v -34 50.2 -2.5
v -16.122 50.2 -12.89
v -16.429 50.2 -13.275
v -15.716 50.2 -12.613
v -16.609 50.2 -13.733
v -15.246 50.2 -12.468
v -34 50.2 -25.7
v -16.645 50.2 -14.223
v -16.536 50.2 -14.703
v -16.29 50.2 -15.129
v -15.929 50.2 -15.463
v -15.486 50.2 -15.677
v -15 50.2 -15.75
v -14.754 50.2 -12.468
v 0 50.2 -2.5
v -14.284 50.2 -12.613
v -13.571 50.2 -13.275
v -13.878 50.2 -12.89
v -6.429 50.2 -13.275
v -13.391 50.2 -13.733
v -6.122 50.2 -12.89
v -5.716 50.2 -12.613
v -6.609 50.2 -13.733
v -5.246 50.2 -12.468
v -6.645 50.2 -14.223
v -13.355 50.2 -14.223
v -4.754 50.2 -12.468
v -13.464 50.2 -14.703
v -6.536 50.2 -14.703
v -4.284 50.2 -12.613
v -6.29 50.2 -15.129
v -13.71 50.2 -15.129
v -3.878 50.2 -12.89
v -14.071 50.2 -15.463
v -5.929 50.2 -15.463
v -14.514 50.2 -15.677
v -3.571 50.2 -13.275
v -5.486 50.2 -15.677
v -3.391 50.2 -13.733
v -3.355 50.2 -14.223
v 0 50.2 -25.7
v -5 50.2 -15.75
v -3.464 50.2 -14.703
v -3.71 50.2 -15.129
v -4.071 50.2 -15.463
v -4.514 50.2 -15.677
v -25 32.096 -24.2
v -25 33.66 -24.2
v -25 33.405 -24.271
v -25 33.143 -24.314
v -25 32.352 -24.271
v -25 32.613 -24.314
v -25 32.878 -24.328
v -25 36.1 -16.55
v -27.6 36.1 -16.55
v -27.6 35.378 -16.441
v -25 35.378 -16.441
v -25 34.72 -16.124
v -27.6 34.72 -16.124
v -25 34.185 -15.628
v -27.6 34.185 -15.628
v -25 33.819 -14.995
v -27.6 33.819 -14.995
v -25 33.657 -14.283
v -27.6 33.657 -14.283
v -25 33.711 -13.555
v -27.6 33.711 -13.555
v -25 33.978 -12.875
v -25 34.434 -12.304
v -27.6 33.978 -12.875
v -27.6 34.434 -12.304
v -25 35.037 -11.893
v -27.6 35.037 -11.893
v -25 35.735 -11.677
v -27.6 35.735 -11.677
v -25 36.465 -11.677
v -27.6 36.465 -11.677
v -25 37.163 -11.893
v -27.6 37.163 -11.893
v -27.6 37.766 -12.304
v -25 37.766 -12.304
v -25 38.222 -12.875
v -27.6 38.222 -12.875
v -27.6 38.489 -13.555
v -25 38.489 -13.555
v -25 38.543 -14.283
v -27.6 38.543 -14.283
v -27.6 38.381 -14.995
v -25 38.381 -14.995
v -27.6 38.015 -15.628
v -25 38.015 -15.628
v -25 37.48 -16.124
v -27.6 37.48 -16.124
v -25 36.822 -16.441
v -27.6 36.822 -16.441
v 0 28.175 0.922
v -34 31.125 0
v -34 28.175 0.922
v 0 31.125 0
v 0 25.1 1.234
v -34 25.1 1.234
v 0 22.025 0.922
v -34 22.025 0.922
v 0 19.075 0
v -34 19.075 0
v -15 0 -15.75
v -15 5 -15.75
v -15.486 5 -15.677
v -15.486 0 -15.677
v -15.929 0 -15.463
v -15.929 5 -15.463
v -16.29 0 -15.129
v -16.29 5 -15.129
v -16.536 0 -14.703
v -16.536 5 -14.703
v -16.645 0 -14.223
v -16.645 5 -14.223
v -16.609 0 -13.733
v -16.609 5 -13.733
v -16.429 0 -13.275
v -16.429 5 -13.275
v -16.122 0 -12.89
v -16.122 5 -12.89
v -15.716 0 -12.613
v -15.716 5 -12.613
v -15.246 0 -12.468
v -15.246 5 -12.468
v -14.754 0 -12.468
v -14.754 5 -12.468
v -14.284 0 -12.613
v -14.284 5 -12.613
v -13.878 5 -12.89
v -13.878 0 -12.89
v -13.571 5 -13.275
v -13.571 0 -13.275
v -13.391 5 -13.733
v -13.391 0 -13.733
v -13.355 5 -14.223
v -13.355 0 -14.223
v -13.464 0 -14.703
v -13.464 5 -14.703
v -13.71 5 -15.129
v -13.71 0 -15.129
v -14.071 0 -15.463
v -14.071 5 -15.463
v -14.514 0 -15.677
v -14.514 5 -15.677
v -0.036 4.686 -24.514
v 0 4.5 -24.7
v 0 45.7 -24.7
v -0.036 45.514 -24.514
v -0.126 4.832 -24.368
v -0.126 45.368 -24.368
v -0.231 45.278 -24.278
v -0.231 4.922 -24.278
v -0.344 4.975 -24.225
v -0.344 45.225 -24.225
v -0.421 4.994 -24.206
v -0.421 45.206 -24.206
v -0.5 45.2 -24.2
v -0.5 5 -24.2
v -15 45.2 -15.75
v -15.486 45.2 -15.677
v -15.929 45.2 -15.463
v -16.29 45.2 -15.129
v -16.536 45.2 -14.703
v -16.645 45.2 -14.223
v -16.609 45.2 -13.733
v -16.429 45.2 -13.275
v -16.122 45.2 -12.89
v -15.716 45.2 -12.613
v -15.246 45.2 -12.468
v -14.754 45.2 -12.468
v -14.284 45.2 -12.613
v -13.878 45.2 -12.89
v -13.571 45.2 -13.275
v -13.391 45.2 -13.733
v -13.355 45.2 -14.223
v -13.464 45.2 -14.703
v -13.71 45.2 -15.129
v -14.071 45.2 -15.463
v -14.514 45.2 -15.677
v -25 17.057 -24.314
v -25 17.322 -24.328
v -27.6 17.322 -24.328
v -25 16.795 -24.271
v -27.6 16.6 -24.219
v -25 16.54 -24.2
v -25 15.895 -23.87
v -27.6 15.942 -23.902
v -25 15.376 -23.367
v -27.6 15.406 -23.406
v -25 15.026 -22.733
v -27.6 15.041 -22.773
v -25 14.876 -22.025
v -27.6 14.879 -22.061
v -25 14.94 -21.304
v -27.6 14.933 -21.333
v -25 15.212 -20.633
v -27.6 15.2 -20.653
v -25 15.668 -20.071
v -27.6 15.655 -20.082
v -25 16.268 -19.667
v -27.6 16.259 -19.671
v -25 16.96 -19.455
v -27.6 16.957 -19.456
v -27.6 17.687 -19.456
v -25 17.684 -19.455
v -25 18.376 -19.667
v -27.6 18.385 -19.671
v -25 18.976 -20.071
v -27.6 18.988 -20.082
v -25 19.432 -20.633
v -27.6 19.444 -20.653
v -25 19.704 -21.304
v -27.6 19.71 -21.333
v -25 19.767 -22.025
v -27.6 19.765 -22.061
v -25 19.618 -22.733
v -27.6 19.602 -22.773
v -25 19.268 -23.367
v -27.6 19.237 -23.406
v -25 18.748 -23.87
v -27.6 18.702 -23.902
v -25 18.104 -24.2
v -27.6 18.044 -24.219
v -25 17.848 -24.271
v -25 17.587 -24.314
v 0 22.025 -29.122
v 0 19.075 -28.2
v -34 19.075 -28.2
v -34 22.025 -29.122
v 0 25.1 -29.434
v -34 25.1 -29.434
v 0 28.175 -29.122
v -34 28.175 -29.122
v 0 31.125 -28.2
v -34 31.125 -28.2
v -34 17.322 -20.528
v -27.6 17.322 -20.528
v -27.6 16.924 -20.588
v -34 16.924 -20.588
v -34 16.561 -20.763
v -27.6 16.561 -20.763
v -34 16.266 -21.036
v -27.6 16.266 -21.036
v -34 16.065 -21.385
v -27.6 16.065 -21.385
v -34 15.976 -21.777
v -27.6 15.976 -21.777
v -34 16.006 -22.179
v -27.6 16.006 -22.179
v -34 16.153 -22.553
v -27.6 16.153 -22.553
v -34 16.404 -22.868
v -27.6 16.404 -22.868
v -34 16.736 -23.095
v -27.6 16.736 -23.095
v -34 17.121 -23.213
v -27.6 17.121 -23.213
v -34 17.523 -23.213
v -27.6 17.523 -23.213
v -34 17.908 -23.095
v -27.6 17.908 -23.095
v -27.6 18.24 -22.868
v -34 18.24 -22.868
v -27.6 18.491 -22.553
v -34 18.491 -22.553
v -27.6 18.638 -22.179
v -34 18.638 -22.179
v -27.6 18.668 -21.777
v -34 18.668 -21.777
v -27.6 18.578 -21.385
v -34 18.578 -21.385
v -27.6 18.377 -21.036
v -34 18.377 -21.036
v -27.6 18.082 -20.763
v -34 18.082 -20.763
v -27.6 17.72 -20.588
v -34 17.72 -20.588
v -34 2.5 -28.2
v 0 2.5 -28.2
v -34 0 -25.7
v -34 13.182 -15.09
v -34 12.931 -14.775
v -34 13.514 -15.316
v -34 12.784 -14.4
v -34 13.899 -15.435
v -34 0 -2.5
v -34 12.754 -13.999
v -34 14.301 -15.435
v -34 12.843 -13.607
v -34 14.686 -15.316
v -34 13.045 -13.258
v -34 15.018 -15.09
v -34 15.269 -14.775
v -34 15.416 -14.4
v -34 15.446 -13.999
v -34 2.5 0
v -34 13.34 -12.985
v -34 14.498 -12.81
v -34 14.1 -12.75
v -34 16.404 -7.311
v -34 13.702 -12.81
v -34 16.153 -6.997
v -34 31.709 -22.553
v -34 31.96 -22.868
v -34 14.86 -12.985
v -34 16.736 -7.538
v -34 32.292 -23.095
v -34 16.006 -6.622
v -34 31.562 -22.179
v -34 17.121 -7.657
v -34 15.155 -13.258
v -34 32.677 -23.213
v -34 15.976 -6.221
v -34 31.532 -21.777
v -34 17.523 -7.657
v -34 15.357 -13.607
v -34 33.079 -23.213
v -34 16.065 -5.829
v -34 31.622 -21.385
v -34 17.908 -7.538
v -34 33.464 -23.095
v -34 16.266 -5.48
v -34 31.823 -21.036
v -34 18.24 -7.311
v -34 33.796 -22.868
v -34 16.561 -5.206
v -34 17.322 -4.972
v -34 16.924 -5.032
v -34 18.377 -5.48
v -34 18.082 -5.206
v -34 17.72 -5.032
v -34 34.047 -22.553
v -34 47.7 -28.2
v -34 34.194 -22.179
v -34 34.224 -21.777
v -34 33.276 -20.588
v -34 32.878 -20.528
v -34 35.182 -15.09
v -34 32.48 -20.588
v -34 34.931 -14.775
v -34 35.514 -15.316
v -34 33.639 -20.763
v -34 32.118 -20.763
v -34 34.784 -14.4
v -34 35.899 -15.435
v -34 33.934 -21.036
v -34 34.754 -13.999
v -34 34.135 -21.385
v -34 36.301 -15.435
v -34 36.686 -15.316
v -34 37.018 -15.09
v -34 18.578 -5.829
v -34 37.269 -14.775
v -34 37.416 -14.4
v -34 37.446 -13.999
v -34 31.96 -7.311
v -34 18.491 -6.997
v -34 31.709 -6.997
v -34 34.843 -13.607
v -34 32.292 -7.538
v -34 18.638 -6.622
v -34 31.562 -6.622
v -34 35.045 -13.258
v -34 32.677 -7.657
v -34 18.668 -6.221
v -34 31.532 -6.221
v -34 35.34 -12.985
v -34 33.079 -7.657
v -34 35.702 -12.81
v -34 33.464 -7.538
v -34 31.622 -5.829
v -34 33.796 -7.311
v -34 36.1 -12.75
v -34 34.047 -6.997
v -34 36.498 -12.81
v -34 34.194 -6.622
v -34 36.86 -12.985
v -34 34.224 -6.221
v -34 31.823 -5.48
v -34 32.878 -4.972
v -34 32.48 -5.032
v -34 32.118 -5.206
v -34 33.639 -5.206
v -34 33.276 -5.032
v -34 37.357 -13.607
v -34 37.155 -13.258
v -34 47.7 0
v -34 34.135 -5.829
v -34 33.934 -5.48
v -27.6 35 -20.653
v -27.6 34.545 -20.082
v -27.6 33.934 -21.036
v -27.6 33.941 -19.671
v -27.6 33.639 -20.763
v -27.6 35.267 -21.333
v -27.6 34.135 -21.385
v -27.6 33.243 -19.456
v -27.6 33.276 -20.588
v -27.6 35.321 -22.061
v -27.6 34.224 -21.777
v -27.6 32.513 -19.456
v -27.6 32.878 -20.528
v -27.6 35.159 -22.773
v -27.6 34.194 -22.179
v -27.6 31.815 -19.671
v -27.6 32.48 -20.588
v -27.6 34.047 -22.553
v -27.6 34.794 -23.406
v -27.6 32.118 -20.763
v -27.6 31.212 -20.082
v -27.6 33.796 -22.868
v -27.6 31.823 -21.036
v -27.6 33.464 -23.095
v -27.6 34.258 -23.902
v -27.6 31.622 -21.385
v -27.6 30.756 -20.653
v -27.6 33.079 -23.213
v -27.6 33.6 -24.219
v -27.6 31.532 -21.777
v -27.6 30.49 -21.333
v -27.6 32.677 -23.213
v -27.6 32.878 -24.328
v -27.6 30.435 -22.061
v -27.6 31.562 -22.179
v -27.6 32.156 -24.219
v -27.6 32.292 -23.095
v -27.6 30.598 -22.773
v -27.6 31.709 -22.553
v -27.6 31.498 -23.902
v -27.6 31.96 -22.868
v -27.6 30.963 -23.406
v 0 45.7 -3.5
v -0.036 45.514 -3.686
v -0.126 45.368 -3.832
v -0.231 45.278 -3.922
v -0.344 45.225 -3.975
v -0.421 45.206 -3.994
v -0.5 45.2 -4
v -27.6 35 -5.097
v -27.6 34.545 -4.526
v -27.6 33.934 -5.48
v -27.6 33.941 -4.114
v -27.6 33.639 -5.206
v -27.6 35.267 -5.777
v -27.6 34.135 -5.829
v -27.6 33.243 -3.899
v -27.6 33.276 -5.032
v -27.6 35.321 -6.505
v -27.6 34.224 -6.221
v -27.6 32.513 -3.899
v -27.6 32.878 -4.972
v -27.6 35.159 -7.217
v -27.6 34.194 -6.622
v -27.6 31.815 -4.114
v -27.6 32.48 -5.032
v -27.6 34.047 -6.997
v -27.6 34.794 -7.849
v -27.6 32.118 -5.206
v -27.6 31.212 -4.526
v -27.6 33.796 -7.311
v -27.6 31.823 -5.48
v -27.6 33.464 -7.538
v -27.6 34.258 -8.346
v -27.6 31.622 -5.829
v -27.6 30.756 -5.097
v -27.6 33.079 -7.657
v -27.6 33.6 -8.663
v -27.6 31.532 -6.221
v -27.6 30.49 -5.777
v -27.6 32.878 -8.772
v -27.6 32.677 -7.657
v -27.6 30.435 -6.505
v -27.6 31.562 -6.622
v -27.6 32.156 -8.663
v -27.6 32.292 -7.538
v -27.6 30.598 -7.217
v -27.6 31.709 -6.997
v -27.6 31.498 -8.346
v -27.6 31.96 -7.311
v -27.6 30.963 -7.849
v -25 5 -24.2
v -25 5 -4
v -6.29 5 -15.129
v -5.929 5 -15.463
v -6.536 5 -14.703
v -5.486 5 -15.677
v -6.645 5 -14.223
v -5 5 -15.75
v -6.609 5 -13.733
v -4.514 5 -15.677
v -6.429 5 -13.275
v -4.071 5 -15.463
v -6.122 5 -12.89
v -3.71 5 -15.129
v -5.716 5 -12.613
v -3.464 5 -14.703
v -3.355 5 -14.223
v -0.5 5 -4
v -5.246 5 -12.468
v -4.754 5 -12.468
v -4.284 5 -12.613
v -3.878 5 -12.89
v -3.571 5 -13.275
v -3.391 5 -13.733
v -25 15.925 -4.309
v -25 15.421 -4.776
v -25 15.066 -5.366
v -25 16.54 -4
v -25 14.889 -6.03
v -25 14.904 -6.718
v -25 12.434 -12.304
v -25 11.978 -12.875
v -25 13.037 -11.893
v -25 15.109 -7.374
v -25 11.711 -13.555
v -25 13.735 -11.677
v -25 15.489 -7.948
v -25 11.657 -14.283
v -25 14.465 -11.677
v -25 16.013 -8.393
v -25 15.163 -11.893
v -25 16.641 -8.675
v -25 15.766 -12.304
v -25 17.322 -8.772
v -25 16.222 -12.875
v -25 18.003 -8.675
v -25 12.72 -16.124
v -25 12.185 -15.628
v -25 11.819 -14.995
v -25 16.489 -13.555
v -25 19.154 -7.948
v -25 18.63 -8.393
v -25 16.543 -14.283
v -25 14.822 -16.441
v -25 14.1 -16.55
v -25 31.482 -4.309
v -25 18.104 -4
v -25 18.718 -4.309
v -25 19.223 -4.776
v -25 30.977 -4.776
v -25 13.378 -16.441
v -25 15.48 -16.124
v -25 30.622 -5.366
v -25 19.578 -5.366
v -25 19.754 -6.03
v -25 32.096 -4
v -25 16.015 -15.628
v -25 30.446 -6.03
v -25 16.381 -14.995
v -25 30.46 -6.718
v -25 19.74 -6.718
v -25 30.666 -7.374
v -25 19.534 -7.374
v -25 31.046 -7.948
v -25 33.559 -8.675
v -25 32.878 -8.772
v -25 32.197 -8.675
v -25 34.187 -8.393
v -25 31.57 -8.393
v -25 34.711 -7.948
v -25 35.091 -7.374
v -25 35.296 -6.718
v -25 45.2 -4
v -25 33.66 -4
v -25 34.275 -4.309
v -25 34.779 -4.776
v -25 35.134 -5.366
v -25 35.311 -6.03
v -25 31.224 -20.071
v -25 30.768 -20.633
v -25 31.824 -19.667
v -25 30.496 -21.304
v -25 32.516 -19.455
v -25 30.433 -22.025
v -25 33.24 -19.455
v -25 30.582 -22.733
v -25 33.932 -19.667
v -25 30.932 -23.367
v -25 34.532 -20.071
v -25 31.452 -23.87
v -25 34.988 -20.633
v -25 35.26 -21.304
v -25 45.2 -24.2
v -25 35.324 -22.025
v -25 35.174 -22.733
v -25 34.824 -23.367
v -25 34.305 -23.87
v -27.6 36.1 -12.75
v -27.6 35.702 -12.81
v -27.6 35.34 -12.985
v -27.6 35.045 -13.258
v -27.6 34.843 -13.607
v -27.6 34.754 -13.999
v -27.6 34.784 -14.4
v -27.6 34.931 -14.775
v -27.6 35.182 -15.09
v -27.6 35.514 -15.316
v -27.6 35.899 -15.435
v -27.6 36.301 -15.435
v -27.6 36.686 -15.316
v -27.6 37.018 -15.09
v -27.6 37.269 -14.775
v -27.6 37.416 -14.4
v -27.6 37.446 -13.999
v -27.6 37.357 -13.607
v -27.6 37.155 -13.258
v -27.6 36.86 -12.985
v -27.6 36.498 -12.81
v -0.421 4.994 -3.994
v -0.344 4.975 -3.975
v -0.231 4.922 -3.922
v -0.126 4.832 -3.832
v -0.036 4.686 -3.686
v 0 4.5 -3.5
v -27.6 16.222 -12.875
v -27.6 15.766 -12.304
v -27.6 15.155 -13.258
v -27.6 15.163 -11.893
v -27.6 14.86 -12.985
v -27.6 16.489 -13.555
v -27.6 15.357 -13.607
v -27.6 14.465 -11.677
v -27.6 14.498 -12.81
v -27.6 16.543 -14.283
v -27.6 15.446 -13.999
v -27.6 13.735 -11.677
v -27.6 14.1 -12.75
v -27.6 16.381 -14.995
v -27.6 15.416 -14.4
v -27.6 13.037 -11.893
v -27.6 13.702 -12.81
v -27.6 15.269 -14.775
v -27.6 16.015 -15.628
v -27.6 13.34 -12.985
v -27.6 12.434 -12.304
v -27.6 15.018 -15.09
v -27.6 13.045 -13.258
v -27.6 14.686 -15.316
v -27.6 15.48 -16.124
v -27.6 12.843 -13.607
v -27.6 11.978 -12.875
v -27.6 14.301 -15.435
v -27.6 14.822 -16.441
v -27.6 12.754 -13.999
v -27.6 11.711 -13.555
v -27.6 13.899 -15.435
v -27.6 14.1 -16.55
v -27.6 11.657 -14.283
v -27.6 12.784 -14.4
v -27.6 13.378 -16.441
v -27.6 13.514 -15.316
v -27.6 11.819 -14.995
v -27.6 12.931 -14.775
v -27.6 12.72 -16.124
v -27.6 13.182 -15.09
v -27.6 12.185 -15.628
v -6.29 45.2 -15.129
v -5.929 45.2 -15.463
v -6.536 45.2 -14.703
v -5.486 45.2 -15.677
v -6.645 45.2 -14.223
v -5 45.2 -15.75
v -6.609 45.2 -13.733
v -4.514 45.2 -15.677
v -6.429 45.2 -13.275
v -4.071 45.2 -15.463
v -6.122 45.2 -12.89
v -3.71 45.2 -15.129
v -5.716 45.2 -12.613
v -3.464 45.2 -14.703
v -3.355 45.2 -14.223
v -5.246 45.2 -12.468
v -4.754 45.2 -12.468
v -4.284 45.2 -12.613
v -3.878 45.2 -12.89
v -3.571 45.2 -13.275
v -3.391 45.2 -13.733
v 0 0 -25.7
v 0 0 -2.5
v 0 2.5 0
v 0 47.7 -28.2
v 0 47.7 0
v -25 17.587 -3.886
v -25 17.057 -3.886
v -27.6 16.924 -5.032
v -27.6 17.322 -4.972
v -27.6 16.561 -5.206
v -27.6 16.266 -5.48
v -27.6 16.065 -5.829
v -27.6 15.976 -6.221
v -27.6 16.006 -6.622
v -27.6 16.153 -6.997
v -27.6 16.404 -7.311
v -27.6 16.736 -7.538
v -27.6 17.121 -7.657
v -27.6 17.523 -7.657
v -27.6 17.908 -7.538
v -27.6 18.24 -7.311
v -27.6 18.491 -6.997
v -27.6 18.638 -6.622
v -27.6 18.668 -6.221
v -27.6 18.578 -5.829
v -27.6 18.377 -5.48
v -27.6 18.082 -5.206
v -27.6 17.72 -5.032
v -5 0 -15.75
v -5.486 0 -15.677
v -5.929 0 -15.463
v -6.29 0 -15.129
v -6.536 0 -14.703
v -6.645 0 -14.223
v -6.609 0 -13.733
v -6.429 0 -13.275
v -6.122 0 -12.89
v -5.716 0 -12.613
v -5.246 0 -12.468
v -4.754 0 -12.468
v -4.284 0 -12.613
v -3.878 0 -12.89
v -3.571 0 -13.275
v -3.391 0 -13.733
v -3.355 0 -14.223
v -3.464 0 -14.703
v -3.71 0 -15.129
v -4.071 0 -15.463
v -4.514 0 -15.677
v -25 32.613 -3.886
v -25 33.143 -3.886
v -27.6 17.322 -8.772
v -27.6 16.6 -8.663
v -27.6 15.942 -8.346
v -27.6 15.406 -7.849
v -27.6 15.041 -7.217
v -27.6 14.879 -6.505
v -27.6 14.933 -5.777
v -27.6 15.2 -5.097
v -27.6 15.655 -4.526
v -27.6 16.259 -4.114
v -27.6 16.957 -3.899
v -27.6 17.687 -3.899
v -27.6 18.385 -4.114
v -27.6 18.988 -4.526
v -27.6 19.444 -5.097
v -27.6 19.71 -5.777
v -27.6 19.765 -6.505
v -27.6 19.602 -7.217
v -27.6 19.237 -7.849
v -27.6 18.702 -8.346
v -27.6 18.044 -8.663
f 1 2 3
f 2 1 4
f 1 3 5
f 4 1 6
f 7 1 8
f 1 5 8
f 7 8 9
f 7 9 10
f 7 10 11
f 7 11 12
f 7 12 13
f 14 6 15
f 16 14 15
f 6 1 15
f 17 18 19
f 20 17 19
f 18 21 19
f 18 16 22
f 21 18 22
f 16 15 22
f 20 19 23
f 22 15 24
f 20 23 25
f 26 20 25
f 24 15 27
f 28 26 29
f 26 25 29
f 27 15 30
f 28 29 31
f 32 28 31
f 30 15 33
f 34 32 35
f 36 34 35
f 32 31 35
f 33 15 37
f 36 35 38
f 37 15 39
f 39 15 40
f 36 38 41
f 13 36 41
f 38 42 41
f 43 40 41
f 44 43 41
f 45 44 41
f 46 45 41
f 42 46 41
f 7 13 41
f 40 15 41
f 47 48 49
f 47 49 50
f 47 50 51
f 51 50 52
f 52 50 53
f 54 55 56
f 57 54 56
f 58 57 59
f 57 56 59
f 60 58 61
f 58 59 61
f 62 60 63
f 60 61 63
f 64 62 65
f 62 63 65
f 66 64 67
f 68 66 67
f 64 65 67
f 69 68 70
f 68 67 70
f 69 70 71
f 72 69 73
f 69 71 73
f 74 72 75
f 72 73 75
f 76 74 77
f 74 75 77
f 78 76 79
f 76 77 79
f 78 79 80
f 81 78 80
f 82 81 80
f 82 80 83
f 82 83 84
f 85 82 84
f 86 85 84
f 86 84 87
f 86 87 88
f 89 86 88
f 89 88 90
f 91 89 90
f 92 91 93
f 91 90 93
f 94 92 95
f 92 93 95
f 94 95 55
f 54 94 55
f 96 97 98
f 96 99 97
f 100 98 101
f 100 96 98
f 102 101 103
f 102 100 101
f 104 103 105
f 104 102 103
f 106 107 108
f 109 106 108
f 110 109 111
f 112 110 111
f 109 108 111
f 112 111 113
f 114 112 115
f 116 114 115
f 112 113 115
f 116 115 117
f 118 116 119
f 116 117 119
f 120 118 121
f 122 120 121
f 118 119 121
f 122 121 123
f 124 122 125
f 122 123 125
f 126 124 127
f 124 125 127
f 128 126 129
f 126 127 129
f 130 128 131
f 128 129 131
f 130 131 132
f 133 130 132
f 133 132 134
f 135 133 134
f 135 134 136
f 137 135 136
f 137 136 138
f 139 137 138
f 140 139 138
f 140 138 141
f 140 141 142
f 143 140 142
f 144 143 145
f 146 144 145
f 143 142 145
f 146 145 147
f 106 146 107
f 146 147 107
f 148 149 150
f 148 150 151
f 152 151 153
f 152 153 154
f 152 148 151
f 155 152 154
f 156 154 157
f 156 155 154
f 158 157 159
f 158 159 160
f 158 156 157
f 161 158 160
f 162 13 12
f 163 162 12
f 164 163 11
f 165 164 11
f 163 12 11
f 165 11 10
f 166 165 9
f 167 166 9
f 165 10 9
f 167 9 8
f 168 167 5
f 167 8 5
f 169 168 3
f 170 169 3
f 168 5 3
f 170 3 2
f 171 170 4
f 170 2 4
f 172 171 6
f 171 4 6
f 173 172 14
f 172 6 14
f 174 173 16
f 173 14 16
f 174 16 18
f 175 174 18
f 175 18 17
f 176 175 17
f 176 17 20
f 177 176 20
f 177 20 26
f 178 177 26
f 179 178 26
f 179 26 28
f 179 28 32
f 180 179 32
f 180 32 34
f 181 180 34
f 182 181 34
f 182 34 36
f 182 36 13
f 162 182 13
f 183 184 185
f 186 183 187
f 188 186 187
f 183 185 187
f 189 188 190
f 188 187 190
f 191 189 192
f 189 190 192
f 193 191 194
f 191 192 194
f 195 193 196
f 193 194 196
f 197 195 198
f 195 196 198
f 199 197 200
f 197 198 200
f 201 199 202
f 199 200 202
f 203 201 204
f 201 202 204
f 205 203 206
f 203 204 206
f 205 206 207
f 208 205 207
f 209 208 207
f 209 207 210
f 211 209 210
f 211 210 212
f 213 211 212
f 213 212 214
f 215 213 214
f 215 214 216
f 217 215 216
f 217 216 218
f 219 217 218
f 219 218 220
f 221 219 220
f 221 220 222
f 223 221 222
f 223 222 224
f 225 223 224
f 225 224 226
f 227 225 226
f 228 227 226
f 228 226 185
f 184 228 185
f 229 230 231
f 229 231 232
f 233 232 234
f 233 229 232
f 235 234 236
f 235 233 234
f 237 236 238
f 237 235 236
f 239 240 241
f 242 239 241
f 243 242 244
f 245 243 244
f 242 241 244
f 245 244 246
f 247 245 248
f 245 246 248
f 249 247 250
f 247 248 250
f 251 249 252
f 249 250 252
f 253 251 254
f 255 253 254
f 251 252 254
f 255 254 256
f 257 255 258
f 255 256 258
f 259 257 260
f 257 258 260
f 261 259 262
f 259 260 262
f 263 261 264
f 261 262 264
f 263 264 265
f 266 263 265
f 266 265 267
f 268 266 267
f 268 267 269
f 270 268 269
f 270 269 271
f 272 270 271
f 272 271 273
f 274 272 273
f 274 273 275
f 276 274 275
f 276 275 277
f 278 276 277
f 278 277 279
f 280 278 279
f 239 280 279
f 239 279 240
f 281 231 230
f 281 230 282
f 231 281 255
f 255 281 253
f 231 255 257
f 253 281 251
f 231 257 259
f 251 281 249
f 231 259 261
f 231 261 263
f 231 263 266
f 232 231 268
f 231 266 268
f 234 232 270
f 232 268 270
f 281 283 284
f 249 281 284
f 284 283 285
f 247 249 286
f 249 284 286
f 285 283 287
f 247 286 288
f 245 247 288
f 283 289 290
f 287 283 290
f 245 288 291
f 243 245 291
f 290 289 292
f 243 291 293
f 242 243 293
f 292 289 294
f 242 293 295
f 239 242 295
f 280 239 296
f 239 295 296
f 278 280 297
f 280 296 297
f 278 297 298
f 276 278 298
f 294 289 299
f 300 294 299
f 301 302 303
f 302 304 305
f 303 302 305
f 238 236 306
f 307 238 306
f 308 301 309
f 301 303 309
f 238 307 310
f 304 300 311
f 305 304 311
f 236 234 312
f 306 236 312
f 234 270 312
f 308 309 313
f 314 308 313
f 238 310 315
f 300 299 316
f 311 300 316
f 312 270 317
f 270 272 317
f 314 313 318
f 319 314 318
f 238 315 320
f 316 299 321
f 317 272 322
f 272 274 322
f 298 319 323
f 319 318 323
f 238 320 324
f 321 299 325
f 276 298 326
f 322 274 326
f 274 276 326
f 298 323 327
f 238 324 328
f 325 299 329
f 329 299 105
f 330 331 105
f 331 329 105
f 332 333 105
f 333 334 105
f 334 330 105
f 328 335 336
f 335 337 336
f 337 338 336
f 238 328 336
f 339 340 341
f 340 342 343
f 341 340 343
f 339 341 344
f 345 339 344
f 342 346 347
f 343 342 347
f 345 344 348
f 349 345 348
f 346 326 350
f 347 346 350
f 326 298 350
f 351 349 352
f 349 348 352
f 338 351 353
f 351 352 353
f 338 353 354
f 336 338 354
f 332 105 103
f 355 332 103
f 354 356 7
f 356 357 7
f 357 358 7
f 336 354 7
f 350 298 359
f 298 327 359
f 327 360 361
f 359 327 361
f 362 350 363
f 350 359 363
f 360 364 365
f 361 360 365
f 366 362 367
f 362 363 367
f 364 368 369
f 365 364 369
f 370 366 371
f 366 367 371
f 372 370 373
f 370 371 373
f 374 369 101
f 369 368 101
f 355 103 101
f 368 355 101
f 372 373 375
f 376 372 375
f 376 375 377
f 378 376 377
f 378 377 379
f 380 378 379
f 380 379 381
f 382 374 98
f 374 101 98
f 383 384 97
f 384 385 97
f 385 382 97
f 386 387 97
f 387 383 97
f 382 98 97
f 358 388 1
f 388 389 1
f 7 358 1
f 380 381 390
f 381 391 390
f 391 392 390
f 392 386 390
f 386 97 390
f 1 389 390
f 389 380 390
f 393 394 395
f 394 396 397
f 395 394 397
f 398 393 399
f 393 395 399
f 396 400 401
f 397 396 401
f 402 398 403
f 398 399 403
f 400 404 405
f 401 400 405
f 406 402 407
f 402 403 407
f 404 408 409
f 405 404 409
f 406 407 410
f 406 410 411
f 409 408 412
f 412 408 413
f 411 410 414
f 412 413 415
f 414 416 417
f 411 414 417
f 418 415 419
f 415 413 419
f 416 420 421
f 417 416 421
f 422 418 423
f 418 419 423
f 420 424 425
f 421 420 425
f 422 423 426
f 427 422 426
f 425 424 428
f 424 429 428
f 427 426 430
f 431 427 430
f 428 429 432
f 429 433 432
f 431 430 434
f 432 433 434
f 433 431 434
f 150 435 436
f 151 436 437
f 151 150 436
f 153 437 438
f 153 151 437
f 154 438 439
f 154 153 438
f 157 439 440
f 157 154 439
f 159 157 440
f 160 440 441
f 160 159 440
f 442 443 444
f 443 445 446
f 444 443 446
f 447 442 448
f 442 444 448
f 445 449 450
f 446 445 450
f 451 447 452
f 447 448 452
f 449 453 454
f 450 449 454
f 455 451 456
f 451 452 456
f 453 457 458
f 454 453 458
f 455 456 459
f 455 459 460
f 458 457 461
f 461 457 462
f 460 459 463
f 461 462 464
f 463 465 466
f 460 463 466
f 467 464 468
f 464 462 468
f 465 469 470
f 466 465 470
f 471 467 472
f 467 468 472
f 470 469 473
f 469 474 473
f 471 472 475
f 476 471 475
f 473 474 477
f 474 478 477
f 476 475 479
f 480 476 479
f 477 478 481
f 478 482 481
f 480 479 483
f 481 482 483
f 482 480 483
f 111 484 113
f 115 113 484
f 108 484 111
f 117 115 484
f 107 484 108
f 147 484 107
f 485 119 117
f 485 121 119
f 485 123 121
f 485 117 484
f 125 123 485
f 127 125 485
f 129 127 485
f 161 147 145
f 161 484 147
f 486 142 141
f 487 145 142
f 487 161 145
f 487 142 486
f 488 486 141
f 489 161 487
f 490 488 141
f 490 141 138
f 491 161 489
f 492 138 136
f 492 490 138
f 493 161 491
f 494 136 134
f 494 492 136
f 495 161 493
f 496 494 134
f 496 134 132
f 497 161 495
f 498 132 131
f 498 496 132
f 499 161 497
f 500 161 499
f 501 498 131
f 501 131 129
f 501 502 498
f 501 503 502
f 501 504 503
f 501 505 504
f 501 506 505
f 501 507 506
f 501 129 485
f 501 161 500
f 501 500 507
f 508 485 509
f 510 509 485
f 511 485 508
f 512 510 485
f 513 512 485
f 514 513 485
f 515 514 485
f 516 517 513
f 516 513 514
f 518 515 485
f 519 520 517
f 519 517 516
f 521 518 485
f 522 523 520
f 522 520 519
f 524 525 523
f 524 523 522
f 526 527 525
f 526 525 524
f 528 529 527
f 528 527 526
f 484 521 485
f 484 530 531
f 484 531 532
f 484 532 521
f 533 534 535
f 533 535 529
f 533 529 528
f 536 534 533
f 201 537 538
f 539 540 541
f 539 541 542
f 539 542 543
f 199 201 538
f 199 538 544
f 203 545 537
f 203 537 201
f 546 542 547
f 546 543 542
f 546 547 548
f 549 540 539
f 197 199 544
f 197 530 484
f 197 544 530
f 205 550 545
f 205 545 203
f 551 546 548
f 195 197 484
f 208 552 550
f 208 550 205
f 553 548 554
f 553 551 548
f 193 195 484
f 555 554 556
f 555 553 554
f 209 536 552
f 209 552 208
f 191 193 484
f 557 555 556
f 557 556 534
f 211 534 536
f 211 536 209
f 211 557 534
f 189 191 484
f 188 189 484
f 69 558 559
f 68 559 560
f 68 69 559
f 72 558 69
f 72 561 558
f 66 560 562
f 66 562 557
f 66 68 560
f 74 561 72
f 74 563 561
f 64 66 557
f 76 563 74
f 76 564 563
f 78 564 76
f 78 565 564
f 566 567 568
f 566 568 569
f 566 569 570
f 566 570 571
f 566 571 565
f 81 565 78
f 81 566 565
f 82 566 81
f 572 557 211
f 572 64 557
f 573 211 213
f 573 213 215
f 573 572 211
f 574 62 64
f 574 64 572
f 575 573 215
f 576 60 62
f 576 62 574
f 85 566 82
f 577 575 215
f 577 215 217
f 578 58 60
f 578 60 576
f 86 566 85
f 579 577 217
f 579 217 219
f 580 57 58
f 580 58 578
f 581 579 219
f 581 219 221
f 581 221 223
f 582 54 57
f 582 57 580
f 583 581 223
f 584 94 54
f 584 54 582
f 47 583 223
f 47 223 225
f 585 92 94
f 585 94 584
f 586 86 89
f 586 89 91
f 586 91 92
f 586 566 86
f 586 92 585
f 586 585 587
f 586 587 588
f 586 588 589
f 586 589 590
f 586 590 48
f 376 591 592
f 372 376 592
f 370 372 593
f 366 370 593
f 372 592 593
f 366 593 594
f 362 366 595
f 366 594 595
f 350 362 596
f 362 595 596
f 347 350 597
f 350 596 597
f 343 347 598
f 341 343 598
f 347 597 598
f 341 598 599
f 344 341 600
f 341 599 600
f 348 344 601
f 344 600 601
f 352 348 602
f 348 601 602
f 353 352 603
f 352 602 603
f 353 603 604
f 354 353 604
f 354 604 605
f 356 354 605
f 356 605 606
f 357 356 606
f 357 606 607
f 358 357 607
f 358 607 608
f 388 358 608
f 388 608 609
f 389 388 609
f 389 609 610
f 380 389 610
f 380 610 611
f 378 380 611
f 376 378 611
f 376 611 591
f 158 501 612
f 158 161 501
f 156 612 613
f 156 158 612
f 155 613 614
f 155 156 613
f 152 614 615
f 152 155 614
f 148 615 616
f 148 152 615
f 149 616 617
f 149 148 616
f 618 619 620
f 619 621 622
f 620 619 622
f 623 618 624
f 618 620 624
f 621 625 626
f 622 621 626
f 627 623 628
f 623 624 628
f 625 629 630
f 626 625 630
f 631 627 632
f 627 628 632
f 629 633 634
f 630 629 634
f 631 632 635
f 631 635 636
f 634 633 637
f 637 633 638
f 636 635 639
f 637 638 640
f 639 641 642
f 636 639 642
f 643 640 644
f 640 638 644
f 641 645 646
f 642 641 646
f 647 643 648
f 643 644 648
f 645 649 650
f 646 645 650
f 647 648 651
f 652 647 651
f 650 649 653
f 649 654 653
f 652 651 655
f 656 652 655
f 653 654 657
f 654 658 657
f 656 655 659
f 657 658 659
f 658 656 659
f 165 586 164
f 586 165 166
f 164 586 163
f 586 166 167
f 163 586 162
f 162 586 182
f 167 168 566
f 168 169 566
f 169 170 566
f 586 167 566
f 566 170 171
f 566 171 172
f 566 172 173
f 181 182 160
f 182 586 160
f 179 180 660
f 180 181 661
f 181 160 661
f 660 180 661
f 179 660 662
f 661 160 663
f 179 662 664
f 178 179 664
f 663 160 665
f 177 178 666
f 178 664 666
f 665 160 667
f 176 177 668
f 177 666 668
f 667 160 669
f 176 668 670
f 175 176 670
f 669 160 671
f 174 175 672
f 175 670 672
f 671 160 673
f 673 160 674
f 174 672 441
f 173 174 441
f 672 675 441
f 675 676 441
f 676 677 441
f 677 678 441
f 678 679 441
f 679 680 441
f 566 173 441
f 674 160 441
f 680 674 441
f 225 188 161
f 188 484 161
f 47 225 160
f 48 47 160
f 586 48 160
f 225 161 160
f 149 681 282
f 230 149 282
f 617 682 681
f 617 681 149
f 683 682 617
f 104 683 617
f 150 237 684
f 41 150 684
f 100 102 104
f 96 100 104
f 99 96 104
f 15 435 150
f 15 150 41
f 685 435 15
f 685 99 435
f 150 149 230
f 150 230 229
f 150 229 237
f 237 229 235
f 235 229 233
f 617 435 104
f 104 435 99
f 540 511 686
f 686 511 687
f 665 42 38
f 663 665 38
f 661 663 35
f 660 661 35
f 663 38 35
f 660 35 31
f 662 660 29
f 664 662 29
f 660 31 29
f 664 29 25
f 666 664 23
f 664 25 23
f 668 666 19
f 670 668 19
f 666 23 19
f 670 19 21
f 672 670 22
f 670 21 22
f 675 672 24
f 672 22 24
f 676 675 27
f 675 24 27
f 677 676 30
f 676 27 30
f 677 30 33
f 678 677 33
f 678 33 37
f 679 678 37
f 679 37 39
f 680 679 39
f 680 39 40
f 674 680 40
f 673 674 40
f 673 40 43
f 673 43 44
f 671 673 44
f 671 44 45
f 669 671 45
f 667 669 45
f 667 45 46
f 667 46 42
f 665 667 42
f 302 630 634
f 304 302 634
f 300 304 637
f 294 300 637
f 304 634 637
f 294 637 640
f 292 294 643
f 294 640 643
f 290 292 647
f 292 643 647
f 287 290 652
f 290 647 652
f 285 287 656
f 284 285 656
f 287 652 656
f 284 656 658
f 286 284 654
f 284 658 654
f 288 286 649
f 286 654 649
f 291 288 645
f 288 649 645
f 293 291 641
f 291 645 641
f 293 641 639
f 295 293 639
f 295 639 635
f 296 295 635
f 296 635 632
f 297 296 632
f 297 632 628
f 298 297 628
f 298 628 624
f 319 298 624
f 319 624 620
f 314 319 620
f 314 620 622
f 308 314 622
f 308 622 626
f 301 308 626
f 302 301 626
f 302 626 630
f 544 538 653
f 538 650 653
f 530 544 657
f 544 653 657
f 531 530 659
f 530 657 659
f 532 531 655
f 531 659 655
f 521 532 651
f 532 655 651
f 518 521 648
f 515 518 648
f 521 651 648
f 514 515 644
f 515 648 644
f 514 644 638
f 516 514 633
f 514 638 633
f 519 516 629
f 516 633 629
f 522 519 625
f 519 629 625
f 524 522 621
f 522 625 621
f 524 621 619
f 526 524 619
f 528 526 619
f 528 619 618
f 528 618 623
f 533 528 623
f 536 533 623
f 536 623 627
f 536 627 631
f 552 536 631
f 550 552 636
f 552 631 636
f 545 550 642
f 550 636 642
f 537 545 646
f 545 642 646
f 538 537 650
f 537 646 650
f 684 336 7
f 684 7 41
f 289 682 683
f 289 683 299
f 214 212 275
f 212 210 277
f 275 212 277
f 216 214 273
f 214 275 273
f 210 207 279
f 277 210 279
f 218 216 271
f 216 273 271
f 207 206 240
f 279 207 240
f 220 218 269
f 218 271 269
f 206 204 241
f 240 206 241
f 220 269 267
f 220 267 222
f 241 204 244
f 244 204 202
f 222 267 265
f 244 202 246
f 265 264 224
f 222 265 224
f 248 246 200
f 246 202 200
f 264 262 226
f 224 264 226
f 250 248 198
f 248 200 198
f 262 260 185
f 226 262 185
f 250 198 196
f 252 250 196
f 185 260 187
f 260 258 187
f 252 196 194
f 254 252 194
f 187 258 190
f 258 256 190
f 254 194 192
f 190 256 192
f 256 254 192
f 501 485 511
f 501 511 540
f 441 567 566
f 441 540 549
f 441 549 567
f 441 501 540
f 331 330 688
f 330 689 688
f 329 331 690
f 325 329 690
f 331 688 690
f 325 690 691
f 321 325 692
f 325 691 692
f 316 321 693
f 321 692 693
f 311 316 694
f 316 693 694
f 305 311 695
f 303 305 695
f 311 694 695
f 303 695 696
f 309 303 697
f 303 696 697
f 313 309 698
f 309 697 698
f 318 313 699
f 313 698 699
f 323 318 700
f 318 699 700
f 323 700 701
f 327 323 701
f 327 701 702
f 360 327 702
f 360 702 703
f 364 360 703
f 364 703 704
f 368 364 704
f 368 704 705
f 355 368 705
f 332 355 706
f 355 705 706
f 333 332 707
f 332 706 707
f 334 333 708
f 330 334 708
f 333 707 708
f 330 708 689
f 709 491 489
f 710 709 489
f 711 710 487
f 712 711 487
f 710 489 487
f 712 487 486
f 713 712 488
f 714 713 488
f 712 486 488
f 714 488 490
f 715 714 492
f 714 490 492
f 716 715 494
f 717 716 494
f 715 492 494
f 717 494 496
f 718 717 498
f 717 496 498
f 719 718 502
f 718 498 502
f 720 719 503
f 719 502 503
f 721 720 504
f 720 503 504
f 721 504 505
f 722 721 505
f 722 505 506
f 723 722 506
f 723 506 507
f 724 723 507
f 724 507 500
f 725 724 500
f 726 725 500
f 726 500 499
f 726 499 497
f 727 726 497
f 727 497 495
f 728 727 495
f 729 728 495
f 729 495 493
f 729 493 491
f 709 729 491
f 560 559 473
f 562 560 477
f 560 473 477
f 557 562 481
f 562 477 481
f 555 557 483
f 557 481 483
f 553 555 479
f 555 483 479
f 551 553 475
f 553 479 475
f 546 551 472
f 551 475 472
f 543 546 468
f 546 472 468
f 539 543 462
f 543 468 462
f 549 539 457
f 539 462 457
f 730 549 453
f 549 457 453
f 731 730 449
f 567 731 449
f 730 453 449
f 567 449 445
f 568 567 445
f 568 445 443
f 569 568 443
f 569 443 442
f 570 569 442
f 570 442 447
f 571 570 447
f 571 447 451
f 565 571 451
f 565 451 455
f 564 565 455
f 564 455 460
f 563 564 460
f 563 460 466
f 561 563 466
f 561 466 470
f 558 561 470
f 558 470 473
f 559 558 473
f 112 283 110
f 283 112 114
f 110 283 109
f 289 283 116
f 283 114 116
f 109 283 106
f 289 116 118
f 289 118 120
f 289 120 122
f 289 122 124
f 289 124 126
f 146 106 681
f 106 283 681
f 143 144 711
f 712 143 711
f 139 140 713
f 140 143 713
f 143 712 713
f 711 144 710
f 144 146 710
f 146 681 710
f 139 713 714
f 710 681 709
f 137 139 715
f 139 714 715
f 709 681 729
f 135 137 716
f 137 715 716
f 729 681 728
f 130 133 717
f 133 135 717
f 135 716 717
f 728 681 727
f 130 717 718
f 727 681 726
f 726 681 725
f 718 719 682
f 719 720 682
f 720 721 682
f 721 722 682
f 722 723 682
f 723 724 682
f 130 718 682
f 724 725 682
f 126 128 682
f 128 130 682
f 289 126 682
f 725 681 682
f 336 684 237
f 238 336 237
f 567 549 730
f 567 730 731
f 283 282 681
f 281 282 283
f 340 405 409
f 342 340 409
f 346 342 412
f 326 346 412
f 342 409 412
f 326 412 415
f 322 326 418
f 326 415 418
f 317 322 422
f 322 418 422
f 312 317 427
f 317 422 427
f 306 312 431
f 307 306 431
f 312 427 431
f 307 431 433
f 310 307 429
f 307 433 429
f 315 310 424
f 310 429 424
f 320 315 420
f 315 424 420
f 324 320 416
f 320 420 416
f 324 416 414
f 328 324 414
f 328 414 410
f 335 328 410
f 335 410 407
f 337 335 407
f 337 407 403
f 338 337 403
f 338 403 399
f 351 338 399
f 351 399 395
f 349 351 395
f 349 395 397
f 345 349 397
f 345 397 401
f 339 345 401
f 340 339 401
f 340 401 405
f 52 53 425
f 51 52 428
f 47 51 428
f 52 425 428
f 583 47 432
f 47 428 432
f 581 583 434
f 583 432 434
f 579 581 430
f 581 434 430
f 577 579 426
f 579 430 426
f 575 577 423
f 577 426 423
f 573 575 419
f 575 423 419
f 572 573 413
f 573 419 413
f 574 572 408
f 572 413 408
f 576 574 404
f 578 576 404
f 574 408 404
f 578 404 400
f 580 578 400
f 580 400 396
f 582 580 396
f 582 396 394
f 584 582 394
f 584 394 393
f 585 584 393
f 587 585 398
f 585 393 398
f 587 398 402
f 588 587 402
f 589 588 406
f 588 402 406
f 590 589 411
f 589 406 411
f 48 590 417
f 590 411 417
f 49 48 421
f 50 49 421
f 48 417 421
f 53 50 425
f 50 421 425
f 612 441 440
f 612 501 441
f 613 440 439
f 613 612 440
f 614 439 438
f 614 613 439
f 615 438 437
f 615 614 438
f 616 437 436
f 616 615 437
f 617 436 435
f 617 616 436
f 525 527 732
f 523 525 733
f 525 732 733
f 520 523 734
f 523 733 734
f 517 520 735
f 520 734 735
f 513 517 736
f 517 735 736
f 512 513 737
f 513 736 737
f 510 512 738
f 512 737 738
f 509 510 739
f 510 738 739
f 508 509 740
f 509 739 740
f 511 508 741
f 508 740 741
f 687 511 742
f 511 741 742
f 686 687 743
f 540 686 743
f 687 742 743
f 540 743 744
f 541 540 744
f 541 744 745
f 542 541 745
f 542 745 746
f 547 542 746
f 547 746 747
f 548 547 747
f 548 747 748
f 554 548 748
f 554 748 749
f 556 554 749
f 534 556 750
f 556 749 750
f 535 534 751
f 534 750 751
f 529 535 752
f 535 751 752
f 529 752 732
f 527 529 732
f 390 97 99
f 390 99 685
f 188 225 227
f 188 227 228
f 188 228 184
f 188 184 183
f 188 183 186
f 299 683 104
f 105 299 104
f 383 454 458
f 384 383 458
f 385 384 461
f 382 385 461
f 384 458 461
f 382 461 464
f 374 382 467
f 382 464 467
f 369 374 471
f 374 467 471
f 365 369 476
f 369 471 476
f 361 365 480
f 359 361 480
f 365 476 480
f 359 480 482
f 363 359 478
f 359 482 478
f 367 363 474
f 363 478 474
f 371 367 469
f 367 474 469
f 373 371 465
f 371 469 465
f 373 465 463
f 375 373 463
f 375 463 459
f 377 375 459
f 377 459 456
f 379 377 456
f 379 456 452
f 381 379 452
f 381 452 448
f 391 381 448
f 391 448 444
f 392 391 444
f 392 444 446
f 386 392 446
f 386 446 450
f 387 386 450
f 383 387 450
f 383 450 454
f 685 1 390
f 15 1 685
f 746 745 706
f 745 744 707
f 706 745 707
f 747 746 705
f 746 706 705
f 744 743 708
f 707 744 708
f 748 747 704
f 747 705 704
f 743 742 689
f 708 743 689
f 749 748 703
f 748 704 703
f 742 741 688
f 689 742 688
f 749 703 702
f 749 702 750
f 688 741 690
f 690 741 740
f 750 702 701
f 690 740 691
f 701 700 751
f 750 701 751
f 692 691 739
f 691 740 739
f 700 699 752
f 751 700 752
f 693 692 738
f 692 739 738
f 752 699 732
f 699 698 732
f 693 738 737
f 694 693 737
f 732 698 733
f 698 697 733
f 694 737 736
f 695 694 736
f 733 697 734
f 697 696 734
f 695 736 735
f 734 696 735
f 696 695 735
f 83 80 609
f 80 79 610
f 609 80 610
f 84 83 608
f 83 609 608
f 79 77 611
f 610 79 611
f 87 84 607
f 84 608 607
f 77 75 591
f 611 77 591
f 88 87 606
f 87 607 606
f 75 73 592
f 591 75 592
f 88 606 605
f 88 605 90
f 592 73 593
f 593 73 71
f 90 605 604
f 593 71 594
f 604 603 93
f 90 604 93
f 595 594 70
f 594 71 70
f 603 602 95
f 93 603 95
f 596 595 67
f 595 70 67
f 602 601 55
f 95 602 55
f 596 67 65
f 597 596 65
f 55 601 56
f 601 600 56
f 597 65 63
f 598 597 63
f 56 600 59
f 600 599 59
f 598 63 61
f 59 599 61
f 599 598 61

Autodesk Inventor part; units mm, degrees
ref_plane "YZ Plane" through (0, 0, 0) normal (1, 0, 0) x (0, 1, 0)
ref_plane "XZ Plane" through (0, 0, 0) normal (0, 1, 0) x (-1, 0, 0)
ref_plane "XY Plane" through (0, 0, 0) normal (0, 0, 1) x (1, 0, 0)
sketch "スケッチ1" plane through (0, 0, 0) normal (1, 0, 0) x (0, 1, 0)
  line L0 (0, 0) -> (50.2, 0)
  line L1 (50.2, 0) -> (50.2, -28.2)
  line L2 (50.2, -28.2) -> (0, -28.2)
  line L3 (0, -28.2) -> (0, 0)
  line L4 (50.2, -14.1) -> (0, -14.1)
  line L5 (25.1, -28.2) -> (25.1, 0)
  circle A0 centre (25.1, -14.1) radius 15.3335
  point P0 (19.0745, 0)
  point P1 (19.0745, -28.2)
  point P2 (31.1255, -28.2)
  point P3 (31.1255, 0)
  dimension "d0" = 50.2
  dimension "d1" = 28.2
  dimension "d2" = 30.667
extrude "押し出し1" add sketch "スケッチ1" against normal blind 34
chamfer "面取り1" distance 2.5 angle 45 4 edges at (-17, 50.2, 0) (-17, 50.2, -28.2) (-17, 0, 0) (-17, 0, -28.2)
sketch "スケッチ2" plane through (-34, 0, 0) normal (-1, 0, 0) x (0, 0, 1)
  arc A0 (-28.2, 31.1255) -> (-28.2, 19.0745) centre (-14.1, 25.1) ccw projected
  circle A1 centre (-14.1, 25.1) radius 19.5
  point P0 (0, 0)
  dimension "d8" = 39
extrude "押し出し2" [suppressed]
sketch "スケッチ3" plane through (-36.375, 22.6, -13.1) normal (-1, 0, 0) x (0, 0, 1)
  arc A0 (-13.1, -14.4444) -> (13.1, -14.4444) centre (0, 0) ccw projected
  circle A1 centre (0, 0) radius 23
  point P0 (13.1, -22.6)
  dimension "d11" = 46
extrude "押し出し3" [suppressed]
sketch "スケッチ4" plane through (-42.675, 22.6, -13.1) normal (-1, 0, 0) x (0, 0, 1)
  circle A0 centre (0, 0) radius 23 projected
  line L0 (0, 0) -> (19.85, 0)
  line L1 (19.85, 0) -> (19.85, 16.35)
  line L2 (19.85, 16.35) -> (0, 16.35)
  line L3 (0, 16.35) -> (0, 0)
  line L4 (10.6, 22.6) -> (-10.6, 22.6) projected
  line L5 (19.85, 0) -> (0, 0)
  line L6 (0, 0) -> (0, -14.35)
  line L7 (0, -14.35) -> (19.85, -14.35)
  line L8 (19.85, -14.35) -> (19.85, 0)
  line L9 (-19.85, 0) -> (-19.85, 16.35)
  line L10 (-19.85, 16.35) -> (0, 16.35)
  line L11 (0, -14.35) -> (-19.85, -14.35)
  line L12 (-19.85, -14.35) -> (-19.85, 0)
  point P0 (13.1, -22.6)
  point P1 (17.9744, -14.35)
  point P2 (19.85, -11.618)
  point P3 (19.85, 11.618)
  point P4 (16.1764, 16.35)
  point P5 (-16.1764, 16.35)
  point P6 (-19.85, 11.618)
  point P7 (-19.85, -11.618)
  point P8 (-17.9744, -14.35)
  dimension "d14" = 6.25
  dimension "d16" = 19.85
  dimension "d17" = 30.7
extrude "押し出し4" [suppressed]
sketch "スケッチ5" plane through (-47.675, 22.6, -13.1) normal (-1, 0, 0) x (0, 0, 1)
  line L0 (-16.1764, 16.35) -> (16.1764, 16.35) projected
  line L1 (0, 16.35) -> (0, -14.35)
  line L2 (17.9744, -14.35) -> (-17.9744, -14.35) projected
  line L3 (0, -14.35) -> (16.75, -14.35)
  line L4 (16.75, -14.35) -> (16.75, 13.35)
  line L5 (16.75, 13.35) -> (0, 13.35)
  line L6 (0, 13.35) -> (0, -14.35)
  line L7 (19.85, -11.618) -> (19.85, 11.618) projected
  line L8 (-16.75, -14.35) -> (-16.75, 13.35)
  line L9 (-16.75, 13.35) -> (0, 13.35)
  point P0 (13.1, -22.6)
  point P1 (19.85, -14.35)
  point P2 (19.85, 16.35)
  point P3 (-16.75, -14.35)
  dimension "d20" = 3
  dimension "d21" = 3.1
extrude "押し出し5" [suppressed]
sketch "スケッチ6" plane through (0, 0, 0) normal (1, 0, 0) x (0, 0, -1)
  line L0 (2.5, 50.2) -> (25.7, 50.2) projected
  line L1 (14.1, 50.2) -> (14.1, 0)
  line L2 (2.5, 0) -> (25.7, 0) projected
  arc A0 (0, 31.1255) -> (0, 19.0745) centre (14.1, 25.1) ccw projected
  line L3 (14.1, 25.1) -> (29.4335, 25.1)
  arc A1 (28.2, 19.0745) -> (28.2, 31.1255) centre (14.1, 25.1) ccw projected
  line L4 (14.1, 25.1) -> (24.2, 25.1)
  line L5 (24.2, 25.1) -> (24.2, 45.2)
  line L6 (24.2, 45.2) -> (14.1, 45.2)
  line L7 (14.1, 45.2) -> (14.1, 25.1)
  line L8 (24.2, 25.1) -> (24.2, 5)
  line L9 (24.2, 5) -> (14.1, 5)
  line L10 (4, 25.1) -> (4, 45.2)
  line L11 (4, 45.2) -> (14.1, 45.2)
  line L12 (4, 5) -> (14.1, 5)
  line L13 (4, 25.1) -> (4, 5)
  point P0 (0, 0)
  dimension "d24" = 20.1
  dimension "d25" = 10.1
extrude "押し出し6" cut sketch "スケッチ6" against normal blind 25
sketch "スケッチ7" plane through (-42.675, 22.6, -13.1) normal (-1, 0, 0) x (0, 0, 1)
  circle A0 centre (0, -0.4) radius 13
  line L0 (-16.75, 13.35) -> (16.75, 13.35) projected
  line L1 (0, 13.35) -> (0, -0.4)
  point P0 (13.1, -22.6)
  dimension "d28" = 26
  dimension "d29" = 13.75
extrude "押し出し7" [suppressed]
sketch "スケッチ8" plane through (-40.175, 22.2, -13.1) normal (-1, 0, 0) x (0, 0, 1)
  circle A0 centre (0, 0) radius 5
  point P0 (13.1, -22.2)
  dimension "d32" = 10
extrude "押し出し8" [suppressed]
sketch "スケッチ9" plane through (-40.175, 22.2, -13.1) normal (-1, 0, 0) x (0, 0, 1)
  circle A0 centre (0, 0) radius 11
  circle A1 centre (0, 0) radius 13 projected
  point P0 (13.1, -22.2)
  point P1 (0, 11)
  point P2 (-7.7782, 7.7782)
  point P3 (-11, 0)
  point P4 (-7.7782, -7.7782)
  point P5 (0, -11)
  point P6 (7.7782, -7.7782)
  point P7 (11, 0)
  point P8 (7.7782, 7.7782)
  dimension "d35" = 22
  dimension "d38" = 360
hole "穴1" [suppressed]
sketch "スケッチ11" plane through (-37.875, 22.2, -13.1) normal (-1, 0, 0) x (0, 0, 1)
  circle A0 centre (0, 0) radius 5 projected
  point P0 (13.1, -22.2)
hole "穴2" [suppressed]
sketch "スケッチ12" plane through (-25, 0, 0) normal (1, 0, 0) x (0, 0, -1)
  circle A0 centre (13.1, 22.2) radius 1.55 projected
  circle A1 centre (13.1, 22.2) radius 3
  point P0 (0, 0)
  dimension "d57" = 6
extrude "押し出し10" [suppressed]
sketch "スケッチ13" plane through (-25, 0, 0) normal (1, 0, 0) x (0, 0, -1)
  circle A0 centre (5.3218, 29.9782) radius 1.25 projected
  circle A1 centre (5.3218, 29.9782) radius 2.25
  circle A2 centre (20.8782, 29.9782) radius 1.25 projected
  circle A3 centre (20.8782, 29.9782) radius 2.25
  circle A4 centre (5.3218, 14.4218) radius 1.25 projected
  circle A5 centre (5.3218, 14.4218) radius 2.25
  circle A6 centre (20.8782, 14.4218) radius 1.25 projected
  circle A7 centre (20.8782, 14.4218) radius 2.25
  point P0 (0, 0)
  dimension "d60" = 4.5
  dimension "d61" = 4.5
  dimension "d62" = 4.5
  dimension "d63" = 4.5
extrude "押し出し11" [suppressed]
sketch "スケッチ14" plane through (-25, 0, 0) normal (1, 0, 0) x (0, 0, -1)
  line L0 (4, 45.2) -> (24.2, 45.2) projected
  line L1 (14.1, 45.2) -> (14.1, 5)
  line L2 (24.2, 5) -> (4, 5) projected
  point P0 (0, 0)
  point P1 (14.1, 15.1)
  point P2 (14.1, 25.1)
  point P3 (14.1, 35.1)
  dimension "d66" = 10
  dimension "d67" = 10
hole "穴3" [suppressed]
sketch "スケッチ15" plane through (-40.175, 22.2, -13.1) normal (-1, 0, 0) x (0, 0, 1)
  point P0 (13.1, -22.2)
sketch "スケッチ16" plane through (-34, 0, 0) normal (-1, 0, 0) x (0, 0, 1)
  arc A0 (-28.2, 31.1255) -> (-28.2, 19.0745) centre (-14.1, 25.1) ccw projected
  circle A1 centre (-14.1, 25.1) radius 11
  point P0 (0, 0)
  point P1 (-14.1, 36.1)
  point P2 (-6.3218, 32.8782)
  point P3 (-3.1, 25.1)
  point P4 (-6.3218, 17.3218)
  point P5 (-14.1, 14.1)
  point P6 (-21.8782, 17.3218)
  point P7 (-25.1, 25.1)
  point P8 (-21.8782, 32.8782)
  dimension "d75" = 22
  dimension "d78" = 360
hole "穴4" at (-34, 32.8782, -21.8782) at (-34, 36.1, -14.1) at (-34, 32.8782, -6.3218) at (-34, 17.3218, -6.3218) at (-34, 14.1, -14.1) at (-34, 17.3218, -21.8782) direction (1, 0, 0) diameter 2.7 end through all
sketch "スケッチ17" plane through (-25, 0, 0) normal (1, 0, 0) x (0, 0, -1)
  circle A0 centre (14.1, 36.1) radius 1.35 projected
  circle A1 centre (6.3218, 32.8782) radius 1.35 projected
  circle A2 centre (21.8782, 32.8782) radius 1.35 projected
  circle A3 centre (21.8782, 17.3218) radius 1.35 projected
  circle A4 centre (14.1, 14.1) radius 1.35 projected
  circle A5 centre (6.3218, 17.3218) radius 1.35 projected
  point P0 (0, 0)
hole "穴5" at (-25, 36.1, -14.1) at (-25, 32.8782, -6.3218) at (-25, 32.8782, -21.8782) at (-25, 17.3218, -21.8782) at (-25, 14.1, -14.1) at (-25, 17.3218, -6.3218) direction (-1, 0, 0) diameter 4.9 depth 2.6
sketch "スケッチ18" plane through (0, 0, -25.7) normal (0, -1, 0) x (1, 0, 0)
  line L0 (-34, 0) -> (0, 0) projected
  line L1 (-15, 0) -> (-15, 23.2)
  line L2 (0, 23.2) -> (-34, 23.2) projected
  line L3 (-25, 1.5) -> (-25, 21.7) projected
  line L4 (-5, 0) -> (-5, 23.2)
  line L5 (-5, 11.6) -> (-15, 11.6)
  point P0 (0, 25.7)
  dimension "d94" = 10
  dimension "d95" = 10
hole "穴6" at (-15, 0, -14.1) at (-5, 0, -14.1) direction (0, 1, 0) diameter 3.3 end through all
fillet "フィレット1" radius 0.5 4 edges at (0, 45.2, -14.1) (0, 25.1, -4) (0, 25.1, -24.2) (0, 5, -14.1)
properties part number "connectpart1"
